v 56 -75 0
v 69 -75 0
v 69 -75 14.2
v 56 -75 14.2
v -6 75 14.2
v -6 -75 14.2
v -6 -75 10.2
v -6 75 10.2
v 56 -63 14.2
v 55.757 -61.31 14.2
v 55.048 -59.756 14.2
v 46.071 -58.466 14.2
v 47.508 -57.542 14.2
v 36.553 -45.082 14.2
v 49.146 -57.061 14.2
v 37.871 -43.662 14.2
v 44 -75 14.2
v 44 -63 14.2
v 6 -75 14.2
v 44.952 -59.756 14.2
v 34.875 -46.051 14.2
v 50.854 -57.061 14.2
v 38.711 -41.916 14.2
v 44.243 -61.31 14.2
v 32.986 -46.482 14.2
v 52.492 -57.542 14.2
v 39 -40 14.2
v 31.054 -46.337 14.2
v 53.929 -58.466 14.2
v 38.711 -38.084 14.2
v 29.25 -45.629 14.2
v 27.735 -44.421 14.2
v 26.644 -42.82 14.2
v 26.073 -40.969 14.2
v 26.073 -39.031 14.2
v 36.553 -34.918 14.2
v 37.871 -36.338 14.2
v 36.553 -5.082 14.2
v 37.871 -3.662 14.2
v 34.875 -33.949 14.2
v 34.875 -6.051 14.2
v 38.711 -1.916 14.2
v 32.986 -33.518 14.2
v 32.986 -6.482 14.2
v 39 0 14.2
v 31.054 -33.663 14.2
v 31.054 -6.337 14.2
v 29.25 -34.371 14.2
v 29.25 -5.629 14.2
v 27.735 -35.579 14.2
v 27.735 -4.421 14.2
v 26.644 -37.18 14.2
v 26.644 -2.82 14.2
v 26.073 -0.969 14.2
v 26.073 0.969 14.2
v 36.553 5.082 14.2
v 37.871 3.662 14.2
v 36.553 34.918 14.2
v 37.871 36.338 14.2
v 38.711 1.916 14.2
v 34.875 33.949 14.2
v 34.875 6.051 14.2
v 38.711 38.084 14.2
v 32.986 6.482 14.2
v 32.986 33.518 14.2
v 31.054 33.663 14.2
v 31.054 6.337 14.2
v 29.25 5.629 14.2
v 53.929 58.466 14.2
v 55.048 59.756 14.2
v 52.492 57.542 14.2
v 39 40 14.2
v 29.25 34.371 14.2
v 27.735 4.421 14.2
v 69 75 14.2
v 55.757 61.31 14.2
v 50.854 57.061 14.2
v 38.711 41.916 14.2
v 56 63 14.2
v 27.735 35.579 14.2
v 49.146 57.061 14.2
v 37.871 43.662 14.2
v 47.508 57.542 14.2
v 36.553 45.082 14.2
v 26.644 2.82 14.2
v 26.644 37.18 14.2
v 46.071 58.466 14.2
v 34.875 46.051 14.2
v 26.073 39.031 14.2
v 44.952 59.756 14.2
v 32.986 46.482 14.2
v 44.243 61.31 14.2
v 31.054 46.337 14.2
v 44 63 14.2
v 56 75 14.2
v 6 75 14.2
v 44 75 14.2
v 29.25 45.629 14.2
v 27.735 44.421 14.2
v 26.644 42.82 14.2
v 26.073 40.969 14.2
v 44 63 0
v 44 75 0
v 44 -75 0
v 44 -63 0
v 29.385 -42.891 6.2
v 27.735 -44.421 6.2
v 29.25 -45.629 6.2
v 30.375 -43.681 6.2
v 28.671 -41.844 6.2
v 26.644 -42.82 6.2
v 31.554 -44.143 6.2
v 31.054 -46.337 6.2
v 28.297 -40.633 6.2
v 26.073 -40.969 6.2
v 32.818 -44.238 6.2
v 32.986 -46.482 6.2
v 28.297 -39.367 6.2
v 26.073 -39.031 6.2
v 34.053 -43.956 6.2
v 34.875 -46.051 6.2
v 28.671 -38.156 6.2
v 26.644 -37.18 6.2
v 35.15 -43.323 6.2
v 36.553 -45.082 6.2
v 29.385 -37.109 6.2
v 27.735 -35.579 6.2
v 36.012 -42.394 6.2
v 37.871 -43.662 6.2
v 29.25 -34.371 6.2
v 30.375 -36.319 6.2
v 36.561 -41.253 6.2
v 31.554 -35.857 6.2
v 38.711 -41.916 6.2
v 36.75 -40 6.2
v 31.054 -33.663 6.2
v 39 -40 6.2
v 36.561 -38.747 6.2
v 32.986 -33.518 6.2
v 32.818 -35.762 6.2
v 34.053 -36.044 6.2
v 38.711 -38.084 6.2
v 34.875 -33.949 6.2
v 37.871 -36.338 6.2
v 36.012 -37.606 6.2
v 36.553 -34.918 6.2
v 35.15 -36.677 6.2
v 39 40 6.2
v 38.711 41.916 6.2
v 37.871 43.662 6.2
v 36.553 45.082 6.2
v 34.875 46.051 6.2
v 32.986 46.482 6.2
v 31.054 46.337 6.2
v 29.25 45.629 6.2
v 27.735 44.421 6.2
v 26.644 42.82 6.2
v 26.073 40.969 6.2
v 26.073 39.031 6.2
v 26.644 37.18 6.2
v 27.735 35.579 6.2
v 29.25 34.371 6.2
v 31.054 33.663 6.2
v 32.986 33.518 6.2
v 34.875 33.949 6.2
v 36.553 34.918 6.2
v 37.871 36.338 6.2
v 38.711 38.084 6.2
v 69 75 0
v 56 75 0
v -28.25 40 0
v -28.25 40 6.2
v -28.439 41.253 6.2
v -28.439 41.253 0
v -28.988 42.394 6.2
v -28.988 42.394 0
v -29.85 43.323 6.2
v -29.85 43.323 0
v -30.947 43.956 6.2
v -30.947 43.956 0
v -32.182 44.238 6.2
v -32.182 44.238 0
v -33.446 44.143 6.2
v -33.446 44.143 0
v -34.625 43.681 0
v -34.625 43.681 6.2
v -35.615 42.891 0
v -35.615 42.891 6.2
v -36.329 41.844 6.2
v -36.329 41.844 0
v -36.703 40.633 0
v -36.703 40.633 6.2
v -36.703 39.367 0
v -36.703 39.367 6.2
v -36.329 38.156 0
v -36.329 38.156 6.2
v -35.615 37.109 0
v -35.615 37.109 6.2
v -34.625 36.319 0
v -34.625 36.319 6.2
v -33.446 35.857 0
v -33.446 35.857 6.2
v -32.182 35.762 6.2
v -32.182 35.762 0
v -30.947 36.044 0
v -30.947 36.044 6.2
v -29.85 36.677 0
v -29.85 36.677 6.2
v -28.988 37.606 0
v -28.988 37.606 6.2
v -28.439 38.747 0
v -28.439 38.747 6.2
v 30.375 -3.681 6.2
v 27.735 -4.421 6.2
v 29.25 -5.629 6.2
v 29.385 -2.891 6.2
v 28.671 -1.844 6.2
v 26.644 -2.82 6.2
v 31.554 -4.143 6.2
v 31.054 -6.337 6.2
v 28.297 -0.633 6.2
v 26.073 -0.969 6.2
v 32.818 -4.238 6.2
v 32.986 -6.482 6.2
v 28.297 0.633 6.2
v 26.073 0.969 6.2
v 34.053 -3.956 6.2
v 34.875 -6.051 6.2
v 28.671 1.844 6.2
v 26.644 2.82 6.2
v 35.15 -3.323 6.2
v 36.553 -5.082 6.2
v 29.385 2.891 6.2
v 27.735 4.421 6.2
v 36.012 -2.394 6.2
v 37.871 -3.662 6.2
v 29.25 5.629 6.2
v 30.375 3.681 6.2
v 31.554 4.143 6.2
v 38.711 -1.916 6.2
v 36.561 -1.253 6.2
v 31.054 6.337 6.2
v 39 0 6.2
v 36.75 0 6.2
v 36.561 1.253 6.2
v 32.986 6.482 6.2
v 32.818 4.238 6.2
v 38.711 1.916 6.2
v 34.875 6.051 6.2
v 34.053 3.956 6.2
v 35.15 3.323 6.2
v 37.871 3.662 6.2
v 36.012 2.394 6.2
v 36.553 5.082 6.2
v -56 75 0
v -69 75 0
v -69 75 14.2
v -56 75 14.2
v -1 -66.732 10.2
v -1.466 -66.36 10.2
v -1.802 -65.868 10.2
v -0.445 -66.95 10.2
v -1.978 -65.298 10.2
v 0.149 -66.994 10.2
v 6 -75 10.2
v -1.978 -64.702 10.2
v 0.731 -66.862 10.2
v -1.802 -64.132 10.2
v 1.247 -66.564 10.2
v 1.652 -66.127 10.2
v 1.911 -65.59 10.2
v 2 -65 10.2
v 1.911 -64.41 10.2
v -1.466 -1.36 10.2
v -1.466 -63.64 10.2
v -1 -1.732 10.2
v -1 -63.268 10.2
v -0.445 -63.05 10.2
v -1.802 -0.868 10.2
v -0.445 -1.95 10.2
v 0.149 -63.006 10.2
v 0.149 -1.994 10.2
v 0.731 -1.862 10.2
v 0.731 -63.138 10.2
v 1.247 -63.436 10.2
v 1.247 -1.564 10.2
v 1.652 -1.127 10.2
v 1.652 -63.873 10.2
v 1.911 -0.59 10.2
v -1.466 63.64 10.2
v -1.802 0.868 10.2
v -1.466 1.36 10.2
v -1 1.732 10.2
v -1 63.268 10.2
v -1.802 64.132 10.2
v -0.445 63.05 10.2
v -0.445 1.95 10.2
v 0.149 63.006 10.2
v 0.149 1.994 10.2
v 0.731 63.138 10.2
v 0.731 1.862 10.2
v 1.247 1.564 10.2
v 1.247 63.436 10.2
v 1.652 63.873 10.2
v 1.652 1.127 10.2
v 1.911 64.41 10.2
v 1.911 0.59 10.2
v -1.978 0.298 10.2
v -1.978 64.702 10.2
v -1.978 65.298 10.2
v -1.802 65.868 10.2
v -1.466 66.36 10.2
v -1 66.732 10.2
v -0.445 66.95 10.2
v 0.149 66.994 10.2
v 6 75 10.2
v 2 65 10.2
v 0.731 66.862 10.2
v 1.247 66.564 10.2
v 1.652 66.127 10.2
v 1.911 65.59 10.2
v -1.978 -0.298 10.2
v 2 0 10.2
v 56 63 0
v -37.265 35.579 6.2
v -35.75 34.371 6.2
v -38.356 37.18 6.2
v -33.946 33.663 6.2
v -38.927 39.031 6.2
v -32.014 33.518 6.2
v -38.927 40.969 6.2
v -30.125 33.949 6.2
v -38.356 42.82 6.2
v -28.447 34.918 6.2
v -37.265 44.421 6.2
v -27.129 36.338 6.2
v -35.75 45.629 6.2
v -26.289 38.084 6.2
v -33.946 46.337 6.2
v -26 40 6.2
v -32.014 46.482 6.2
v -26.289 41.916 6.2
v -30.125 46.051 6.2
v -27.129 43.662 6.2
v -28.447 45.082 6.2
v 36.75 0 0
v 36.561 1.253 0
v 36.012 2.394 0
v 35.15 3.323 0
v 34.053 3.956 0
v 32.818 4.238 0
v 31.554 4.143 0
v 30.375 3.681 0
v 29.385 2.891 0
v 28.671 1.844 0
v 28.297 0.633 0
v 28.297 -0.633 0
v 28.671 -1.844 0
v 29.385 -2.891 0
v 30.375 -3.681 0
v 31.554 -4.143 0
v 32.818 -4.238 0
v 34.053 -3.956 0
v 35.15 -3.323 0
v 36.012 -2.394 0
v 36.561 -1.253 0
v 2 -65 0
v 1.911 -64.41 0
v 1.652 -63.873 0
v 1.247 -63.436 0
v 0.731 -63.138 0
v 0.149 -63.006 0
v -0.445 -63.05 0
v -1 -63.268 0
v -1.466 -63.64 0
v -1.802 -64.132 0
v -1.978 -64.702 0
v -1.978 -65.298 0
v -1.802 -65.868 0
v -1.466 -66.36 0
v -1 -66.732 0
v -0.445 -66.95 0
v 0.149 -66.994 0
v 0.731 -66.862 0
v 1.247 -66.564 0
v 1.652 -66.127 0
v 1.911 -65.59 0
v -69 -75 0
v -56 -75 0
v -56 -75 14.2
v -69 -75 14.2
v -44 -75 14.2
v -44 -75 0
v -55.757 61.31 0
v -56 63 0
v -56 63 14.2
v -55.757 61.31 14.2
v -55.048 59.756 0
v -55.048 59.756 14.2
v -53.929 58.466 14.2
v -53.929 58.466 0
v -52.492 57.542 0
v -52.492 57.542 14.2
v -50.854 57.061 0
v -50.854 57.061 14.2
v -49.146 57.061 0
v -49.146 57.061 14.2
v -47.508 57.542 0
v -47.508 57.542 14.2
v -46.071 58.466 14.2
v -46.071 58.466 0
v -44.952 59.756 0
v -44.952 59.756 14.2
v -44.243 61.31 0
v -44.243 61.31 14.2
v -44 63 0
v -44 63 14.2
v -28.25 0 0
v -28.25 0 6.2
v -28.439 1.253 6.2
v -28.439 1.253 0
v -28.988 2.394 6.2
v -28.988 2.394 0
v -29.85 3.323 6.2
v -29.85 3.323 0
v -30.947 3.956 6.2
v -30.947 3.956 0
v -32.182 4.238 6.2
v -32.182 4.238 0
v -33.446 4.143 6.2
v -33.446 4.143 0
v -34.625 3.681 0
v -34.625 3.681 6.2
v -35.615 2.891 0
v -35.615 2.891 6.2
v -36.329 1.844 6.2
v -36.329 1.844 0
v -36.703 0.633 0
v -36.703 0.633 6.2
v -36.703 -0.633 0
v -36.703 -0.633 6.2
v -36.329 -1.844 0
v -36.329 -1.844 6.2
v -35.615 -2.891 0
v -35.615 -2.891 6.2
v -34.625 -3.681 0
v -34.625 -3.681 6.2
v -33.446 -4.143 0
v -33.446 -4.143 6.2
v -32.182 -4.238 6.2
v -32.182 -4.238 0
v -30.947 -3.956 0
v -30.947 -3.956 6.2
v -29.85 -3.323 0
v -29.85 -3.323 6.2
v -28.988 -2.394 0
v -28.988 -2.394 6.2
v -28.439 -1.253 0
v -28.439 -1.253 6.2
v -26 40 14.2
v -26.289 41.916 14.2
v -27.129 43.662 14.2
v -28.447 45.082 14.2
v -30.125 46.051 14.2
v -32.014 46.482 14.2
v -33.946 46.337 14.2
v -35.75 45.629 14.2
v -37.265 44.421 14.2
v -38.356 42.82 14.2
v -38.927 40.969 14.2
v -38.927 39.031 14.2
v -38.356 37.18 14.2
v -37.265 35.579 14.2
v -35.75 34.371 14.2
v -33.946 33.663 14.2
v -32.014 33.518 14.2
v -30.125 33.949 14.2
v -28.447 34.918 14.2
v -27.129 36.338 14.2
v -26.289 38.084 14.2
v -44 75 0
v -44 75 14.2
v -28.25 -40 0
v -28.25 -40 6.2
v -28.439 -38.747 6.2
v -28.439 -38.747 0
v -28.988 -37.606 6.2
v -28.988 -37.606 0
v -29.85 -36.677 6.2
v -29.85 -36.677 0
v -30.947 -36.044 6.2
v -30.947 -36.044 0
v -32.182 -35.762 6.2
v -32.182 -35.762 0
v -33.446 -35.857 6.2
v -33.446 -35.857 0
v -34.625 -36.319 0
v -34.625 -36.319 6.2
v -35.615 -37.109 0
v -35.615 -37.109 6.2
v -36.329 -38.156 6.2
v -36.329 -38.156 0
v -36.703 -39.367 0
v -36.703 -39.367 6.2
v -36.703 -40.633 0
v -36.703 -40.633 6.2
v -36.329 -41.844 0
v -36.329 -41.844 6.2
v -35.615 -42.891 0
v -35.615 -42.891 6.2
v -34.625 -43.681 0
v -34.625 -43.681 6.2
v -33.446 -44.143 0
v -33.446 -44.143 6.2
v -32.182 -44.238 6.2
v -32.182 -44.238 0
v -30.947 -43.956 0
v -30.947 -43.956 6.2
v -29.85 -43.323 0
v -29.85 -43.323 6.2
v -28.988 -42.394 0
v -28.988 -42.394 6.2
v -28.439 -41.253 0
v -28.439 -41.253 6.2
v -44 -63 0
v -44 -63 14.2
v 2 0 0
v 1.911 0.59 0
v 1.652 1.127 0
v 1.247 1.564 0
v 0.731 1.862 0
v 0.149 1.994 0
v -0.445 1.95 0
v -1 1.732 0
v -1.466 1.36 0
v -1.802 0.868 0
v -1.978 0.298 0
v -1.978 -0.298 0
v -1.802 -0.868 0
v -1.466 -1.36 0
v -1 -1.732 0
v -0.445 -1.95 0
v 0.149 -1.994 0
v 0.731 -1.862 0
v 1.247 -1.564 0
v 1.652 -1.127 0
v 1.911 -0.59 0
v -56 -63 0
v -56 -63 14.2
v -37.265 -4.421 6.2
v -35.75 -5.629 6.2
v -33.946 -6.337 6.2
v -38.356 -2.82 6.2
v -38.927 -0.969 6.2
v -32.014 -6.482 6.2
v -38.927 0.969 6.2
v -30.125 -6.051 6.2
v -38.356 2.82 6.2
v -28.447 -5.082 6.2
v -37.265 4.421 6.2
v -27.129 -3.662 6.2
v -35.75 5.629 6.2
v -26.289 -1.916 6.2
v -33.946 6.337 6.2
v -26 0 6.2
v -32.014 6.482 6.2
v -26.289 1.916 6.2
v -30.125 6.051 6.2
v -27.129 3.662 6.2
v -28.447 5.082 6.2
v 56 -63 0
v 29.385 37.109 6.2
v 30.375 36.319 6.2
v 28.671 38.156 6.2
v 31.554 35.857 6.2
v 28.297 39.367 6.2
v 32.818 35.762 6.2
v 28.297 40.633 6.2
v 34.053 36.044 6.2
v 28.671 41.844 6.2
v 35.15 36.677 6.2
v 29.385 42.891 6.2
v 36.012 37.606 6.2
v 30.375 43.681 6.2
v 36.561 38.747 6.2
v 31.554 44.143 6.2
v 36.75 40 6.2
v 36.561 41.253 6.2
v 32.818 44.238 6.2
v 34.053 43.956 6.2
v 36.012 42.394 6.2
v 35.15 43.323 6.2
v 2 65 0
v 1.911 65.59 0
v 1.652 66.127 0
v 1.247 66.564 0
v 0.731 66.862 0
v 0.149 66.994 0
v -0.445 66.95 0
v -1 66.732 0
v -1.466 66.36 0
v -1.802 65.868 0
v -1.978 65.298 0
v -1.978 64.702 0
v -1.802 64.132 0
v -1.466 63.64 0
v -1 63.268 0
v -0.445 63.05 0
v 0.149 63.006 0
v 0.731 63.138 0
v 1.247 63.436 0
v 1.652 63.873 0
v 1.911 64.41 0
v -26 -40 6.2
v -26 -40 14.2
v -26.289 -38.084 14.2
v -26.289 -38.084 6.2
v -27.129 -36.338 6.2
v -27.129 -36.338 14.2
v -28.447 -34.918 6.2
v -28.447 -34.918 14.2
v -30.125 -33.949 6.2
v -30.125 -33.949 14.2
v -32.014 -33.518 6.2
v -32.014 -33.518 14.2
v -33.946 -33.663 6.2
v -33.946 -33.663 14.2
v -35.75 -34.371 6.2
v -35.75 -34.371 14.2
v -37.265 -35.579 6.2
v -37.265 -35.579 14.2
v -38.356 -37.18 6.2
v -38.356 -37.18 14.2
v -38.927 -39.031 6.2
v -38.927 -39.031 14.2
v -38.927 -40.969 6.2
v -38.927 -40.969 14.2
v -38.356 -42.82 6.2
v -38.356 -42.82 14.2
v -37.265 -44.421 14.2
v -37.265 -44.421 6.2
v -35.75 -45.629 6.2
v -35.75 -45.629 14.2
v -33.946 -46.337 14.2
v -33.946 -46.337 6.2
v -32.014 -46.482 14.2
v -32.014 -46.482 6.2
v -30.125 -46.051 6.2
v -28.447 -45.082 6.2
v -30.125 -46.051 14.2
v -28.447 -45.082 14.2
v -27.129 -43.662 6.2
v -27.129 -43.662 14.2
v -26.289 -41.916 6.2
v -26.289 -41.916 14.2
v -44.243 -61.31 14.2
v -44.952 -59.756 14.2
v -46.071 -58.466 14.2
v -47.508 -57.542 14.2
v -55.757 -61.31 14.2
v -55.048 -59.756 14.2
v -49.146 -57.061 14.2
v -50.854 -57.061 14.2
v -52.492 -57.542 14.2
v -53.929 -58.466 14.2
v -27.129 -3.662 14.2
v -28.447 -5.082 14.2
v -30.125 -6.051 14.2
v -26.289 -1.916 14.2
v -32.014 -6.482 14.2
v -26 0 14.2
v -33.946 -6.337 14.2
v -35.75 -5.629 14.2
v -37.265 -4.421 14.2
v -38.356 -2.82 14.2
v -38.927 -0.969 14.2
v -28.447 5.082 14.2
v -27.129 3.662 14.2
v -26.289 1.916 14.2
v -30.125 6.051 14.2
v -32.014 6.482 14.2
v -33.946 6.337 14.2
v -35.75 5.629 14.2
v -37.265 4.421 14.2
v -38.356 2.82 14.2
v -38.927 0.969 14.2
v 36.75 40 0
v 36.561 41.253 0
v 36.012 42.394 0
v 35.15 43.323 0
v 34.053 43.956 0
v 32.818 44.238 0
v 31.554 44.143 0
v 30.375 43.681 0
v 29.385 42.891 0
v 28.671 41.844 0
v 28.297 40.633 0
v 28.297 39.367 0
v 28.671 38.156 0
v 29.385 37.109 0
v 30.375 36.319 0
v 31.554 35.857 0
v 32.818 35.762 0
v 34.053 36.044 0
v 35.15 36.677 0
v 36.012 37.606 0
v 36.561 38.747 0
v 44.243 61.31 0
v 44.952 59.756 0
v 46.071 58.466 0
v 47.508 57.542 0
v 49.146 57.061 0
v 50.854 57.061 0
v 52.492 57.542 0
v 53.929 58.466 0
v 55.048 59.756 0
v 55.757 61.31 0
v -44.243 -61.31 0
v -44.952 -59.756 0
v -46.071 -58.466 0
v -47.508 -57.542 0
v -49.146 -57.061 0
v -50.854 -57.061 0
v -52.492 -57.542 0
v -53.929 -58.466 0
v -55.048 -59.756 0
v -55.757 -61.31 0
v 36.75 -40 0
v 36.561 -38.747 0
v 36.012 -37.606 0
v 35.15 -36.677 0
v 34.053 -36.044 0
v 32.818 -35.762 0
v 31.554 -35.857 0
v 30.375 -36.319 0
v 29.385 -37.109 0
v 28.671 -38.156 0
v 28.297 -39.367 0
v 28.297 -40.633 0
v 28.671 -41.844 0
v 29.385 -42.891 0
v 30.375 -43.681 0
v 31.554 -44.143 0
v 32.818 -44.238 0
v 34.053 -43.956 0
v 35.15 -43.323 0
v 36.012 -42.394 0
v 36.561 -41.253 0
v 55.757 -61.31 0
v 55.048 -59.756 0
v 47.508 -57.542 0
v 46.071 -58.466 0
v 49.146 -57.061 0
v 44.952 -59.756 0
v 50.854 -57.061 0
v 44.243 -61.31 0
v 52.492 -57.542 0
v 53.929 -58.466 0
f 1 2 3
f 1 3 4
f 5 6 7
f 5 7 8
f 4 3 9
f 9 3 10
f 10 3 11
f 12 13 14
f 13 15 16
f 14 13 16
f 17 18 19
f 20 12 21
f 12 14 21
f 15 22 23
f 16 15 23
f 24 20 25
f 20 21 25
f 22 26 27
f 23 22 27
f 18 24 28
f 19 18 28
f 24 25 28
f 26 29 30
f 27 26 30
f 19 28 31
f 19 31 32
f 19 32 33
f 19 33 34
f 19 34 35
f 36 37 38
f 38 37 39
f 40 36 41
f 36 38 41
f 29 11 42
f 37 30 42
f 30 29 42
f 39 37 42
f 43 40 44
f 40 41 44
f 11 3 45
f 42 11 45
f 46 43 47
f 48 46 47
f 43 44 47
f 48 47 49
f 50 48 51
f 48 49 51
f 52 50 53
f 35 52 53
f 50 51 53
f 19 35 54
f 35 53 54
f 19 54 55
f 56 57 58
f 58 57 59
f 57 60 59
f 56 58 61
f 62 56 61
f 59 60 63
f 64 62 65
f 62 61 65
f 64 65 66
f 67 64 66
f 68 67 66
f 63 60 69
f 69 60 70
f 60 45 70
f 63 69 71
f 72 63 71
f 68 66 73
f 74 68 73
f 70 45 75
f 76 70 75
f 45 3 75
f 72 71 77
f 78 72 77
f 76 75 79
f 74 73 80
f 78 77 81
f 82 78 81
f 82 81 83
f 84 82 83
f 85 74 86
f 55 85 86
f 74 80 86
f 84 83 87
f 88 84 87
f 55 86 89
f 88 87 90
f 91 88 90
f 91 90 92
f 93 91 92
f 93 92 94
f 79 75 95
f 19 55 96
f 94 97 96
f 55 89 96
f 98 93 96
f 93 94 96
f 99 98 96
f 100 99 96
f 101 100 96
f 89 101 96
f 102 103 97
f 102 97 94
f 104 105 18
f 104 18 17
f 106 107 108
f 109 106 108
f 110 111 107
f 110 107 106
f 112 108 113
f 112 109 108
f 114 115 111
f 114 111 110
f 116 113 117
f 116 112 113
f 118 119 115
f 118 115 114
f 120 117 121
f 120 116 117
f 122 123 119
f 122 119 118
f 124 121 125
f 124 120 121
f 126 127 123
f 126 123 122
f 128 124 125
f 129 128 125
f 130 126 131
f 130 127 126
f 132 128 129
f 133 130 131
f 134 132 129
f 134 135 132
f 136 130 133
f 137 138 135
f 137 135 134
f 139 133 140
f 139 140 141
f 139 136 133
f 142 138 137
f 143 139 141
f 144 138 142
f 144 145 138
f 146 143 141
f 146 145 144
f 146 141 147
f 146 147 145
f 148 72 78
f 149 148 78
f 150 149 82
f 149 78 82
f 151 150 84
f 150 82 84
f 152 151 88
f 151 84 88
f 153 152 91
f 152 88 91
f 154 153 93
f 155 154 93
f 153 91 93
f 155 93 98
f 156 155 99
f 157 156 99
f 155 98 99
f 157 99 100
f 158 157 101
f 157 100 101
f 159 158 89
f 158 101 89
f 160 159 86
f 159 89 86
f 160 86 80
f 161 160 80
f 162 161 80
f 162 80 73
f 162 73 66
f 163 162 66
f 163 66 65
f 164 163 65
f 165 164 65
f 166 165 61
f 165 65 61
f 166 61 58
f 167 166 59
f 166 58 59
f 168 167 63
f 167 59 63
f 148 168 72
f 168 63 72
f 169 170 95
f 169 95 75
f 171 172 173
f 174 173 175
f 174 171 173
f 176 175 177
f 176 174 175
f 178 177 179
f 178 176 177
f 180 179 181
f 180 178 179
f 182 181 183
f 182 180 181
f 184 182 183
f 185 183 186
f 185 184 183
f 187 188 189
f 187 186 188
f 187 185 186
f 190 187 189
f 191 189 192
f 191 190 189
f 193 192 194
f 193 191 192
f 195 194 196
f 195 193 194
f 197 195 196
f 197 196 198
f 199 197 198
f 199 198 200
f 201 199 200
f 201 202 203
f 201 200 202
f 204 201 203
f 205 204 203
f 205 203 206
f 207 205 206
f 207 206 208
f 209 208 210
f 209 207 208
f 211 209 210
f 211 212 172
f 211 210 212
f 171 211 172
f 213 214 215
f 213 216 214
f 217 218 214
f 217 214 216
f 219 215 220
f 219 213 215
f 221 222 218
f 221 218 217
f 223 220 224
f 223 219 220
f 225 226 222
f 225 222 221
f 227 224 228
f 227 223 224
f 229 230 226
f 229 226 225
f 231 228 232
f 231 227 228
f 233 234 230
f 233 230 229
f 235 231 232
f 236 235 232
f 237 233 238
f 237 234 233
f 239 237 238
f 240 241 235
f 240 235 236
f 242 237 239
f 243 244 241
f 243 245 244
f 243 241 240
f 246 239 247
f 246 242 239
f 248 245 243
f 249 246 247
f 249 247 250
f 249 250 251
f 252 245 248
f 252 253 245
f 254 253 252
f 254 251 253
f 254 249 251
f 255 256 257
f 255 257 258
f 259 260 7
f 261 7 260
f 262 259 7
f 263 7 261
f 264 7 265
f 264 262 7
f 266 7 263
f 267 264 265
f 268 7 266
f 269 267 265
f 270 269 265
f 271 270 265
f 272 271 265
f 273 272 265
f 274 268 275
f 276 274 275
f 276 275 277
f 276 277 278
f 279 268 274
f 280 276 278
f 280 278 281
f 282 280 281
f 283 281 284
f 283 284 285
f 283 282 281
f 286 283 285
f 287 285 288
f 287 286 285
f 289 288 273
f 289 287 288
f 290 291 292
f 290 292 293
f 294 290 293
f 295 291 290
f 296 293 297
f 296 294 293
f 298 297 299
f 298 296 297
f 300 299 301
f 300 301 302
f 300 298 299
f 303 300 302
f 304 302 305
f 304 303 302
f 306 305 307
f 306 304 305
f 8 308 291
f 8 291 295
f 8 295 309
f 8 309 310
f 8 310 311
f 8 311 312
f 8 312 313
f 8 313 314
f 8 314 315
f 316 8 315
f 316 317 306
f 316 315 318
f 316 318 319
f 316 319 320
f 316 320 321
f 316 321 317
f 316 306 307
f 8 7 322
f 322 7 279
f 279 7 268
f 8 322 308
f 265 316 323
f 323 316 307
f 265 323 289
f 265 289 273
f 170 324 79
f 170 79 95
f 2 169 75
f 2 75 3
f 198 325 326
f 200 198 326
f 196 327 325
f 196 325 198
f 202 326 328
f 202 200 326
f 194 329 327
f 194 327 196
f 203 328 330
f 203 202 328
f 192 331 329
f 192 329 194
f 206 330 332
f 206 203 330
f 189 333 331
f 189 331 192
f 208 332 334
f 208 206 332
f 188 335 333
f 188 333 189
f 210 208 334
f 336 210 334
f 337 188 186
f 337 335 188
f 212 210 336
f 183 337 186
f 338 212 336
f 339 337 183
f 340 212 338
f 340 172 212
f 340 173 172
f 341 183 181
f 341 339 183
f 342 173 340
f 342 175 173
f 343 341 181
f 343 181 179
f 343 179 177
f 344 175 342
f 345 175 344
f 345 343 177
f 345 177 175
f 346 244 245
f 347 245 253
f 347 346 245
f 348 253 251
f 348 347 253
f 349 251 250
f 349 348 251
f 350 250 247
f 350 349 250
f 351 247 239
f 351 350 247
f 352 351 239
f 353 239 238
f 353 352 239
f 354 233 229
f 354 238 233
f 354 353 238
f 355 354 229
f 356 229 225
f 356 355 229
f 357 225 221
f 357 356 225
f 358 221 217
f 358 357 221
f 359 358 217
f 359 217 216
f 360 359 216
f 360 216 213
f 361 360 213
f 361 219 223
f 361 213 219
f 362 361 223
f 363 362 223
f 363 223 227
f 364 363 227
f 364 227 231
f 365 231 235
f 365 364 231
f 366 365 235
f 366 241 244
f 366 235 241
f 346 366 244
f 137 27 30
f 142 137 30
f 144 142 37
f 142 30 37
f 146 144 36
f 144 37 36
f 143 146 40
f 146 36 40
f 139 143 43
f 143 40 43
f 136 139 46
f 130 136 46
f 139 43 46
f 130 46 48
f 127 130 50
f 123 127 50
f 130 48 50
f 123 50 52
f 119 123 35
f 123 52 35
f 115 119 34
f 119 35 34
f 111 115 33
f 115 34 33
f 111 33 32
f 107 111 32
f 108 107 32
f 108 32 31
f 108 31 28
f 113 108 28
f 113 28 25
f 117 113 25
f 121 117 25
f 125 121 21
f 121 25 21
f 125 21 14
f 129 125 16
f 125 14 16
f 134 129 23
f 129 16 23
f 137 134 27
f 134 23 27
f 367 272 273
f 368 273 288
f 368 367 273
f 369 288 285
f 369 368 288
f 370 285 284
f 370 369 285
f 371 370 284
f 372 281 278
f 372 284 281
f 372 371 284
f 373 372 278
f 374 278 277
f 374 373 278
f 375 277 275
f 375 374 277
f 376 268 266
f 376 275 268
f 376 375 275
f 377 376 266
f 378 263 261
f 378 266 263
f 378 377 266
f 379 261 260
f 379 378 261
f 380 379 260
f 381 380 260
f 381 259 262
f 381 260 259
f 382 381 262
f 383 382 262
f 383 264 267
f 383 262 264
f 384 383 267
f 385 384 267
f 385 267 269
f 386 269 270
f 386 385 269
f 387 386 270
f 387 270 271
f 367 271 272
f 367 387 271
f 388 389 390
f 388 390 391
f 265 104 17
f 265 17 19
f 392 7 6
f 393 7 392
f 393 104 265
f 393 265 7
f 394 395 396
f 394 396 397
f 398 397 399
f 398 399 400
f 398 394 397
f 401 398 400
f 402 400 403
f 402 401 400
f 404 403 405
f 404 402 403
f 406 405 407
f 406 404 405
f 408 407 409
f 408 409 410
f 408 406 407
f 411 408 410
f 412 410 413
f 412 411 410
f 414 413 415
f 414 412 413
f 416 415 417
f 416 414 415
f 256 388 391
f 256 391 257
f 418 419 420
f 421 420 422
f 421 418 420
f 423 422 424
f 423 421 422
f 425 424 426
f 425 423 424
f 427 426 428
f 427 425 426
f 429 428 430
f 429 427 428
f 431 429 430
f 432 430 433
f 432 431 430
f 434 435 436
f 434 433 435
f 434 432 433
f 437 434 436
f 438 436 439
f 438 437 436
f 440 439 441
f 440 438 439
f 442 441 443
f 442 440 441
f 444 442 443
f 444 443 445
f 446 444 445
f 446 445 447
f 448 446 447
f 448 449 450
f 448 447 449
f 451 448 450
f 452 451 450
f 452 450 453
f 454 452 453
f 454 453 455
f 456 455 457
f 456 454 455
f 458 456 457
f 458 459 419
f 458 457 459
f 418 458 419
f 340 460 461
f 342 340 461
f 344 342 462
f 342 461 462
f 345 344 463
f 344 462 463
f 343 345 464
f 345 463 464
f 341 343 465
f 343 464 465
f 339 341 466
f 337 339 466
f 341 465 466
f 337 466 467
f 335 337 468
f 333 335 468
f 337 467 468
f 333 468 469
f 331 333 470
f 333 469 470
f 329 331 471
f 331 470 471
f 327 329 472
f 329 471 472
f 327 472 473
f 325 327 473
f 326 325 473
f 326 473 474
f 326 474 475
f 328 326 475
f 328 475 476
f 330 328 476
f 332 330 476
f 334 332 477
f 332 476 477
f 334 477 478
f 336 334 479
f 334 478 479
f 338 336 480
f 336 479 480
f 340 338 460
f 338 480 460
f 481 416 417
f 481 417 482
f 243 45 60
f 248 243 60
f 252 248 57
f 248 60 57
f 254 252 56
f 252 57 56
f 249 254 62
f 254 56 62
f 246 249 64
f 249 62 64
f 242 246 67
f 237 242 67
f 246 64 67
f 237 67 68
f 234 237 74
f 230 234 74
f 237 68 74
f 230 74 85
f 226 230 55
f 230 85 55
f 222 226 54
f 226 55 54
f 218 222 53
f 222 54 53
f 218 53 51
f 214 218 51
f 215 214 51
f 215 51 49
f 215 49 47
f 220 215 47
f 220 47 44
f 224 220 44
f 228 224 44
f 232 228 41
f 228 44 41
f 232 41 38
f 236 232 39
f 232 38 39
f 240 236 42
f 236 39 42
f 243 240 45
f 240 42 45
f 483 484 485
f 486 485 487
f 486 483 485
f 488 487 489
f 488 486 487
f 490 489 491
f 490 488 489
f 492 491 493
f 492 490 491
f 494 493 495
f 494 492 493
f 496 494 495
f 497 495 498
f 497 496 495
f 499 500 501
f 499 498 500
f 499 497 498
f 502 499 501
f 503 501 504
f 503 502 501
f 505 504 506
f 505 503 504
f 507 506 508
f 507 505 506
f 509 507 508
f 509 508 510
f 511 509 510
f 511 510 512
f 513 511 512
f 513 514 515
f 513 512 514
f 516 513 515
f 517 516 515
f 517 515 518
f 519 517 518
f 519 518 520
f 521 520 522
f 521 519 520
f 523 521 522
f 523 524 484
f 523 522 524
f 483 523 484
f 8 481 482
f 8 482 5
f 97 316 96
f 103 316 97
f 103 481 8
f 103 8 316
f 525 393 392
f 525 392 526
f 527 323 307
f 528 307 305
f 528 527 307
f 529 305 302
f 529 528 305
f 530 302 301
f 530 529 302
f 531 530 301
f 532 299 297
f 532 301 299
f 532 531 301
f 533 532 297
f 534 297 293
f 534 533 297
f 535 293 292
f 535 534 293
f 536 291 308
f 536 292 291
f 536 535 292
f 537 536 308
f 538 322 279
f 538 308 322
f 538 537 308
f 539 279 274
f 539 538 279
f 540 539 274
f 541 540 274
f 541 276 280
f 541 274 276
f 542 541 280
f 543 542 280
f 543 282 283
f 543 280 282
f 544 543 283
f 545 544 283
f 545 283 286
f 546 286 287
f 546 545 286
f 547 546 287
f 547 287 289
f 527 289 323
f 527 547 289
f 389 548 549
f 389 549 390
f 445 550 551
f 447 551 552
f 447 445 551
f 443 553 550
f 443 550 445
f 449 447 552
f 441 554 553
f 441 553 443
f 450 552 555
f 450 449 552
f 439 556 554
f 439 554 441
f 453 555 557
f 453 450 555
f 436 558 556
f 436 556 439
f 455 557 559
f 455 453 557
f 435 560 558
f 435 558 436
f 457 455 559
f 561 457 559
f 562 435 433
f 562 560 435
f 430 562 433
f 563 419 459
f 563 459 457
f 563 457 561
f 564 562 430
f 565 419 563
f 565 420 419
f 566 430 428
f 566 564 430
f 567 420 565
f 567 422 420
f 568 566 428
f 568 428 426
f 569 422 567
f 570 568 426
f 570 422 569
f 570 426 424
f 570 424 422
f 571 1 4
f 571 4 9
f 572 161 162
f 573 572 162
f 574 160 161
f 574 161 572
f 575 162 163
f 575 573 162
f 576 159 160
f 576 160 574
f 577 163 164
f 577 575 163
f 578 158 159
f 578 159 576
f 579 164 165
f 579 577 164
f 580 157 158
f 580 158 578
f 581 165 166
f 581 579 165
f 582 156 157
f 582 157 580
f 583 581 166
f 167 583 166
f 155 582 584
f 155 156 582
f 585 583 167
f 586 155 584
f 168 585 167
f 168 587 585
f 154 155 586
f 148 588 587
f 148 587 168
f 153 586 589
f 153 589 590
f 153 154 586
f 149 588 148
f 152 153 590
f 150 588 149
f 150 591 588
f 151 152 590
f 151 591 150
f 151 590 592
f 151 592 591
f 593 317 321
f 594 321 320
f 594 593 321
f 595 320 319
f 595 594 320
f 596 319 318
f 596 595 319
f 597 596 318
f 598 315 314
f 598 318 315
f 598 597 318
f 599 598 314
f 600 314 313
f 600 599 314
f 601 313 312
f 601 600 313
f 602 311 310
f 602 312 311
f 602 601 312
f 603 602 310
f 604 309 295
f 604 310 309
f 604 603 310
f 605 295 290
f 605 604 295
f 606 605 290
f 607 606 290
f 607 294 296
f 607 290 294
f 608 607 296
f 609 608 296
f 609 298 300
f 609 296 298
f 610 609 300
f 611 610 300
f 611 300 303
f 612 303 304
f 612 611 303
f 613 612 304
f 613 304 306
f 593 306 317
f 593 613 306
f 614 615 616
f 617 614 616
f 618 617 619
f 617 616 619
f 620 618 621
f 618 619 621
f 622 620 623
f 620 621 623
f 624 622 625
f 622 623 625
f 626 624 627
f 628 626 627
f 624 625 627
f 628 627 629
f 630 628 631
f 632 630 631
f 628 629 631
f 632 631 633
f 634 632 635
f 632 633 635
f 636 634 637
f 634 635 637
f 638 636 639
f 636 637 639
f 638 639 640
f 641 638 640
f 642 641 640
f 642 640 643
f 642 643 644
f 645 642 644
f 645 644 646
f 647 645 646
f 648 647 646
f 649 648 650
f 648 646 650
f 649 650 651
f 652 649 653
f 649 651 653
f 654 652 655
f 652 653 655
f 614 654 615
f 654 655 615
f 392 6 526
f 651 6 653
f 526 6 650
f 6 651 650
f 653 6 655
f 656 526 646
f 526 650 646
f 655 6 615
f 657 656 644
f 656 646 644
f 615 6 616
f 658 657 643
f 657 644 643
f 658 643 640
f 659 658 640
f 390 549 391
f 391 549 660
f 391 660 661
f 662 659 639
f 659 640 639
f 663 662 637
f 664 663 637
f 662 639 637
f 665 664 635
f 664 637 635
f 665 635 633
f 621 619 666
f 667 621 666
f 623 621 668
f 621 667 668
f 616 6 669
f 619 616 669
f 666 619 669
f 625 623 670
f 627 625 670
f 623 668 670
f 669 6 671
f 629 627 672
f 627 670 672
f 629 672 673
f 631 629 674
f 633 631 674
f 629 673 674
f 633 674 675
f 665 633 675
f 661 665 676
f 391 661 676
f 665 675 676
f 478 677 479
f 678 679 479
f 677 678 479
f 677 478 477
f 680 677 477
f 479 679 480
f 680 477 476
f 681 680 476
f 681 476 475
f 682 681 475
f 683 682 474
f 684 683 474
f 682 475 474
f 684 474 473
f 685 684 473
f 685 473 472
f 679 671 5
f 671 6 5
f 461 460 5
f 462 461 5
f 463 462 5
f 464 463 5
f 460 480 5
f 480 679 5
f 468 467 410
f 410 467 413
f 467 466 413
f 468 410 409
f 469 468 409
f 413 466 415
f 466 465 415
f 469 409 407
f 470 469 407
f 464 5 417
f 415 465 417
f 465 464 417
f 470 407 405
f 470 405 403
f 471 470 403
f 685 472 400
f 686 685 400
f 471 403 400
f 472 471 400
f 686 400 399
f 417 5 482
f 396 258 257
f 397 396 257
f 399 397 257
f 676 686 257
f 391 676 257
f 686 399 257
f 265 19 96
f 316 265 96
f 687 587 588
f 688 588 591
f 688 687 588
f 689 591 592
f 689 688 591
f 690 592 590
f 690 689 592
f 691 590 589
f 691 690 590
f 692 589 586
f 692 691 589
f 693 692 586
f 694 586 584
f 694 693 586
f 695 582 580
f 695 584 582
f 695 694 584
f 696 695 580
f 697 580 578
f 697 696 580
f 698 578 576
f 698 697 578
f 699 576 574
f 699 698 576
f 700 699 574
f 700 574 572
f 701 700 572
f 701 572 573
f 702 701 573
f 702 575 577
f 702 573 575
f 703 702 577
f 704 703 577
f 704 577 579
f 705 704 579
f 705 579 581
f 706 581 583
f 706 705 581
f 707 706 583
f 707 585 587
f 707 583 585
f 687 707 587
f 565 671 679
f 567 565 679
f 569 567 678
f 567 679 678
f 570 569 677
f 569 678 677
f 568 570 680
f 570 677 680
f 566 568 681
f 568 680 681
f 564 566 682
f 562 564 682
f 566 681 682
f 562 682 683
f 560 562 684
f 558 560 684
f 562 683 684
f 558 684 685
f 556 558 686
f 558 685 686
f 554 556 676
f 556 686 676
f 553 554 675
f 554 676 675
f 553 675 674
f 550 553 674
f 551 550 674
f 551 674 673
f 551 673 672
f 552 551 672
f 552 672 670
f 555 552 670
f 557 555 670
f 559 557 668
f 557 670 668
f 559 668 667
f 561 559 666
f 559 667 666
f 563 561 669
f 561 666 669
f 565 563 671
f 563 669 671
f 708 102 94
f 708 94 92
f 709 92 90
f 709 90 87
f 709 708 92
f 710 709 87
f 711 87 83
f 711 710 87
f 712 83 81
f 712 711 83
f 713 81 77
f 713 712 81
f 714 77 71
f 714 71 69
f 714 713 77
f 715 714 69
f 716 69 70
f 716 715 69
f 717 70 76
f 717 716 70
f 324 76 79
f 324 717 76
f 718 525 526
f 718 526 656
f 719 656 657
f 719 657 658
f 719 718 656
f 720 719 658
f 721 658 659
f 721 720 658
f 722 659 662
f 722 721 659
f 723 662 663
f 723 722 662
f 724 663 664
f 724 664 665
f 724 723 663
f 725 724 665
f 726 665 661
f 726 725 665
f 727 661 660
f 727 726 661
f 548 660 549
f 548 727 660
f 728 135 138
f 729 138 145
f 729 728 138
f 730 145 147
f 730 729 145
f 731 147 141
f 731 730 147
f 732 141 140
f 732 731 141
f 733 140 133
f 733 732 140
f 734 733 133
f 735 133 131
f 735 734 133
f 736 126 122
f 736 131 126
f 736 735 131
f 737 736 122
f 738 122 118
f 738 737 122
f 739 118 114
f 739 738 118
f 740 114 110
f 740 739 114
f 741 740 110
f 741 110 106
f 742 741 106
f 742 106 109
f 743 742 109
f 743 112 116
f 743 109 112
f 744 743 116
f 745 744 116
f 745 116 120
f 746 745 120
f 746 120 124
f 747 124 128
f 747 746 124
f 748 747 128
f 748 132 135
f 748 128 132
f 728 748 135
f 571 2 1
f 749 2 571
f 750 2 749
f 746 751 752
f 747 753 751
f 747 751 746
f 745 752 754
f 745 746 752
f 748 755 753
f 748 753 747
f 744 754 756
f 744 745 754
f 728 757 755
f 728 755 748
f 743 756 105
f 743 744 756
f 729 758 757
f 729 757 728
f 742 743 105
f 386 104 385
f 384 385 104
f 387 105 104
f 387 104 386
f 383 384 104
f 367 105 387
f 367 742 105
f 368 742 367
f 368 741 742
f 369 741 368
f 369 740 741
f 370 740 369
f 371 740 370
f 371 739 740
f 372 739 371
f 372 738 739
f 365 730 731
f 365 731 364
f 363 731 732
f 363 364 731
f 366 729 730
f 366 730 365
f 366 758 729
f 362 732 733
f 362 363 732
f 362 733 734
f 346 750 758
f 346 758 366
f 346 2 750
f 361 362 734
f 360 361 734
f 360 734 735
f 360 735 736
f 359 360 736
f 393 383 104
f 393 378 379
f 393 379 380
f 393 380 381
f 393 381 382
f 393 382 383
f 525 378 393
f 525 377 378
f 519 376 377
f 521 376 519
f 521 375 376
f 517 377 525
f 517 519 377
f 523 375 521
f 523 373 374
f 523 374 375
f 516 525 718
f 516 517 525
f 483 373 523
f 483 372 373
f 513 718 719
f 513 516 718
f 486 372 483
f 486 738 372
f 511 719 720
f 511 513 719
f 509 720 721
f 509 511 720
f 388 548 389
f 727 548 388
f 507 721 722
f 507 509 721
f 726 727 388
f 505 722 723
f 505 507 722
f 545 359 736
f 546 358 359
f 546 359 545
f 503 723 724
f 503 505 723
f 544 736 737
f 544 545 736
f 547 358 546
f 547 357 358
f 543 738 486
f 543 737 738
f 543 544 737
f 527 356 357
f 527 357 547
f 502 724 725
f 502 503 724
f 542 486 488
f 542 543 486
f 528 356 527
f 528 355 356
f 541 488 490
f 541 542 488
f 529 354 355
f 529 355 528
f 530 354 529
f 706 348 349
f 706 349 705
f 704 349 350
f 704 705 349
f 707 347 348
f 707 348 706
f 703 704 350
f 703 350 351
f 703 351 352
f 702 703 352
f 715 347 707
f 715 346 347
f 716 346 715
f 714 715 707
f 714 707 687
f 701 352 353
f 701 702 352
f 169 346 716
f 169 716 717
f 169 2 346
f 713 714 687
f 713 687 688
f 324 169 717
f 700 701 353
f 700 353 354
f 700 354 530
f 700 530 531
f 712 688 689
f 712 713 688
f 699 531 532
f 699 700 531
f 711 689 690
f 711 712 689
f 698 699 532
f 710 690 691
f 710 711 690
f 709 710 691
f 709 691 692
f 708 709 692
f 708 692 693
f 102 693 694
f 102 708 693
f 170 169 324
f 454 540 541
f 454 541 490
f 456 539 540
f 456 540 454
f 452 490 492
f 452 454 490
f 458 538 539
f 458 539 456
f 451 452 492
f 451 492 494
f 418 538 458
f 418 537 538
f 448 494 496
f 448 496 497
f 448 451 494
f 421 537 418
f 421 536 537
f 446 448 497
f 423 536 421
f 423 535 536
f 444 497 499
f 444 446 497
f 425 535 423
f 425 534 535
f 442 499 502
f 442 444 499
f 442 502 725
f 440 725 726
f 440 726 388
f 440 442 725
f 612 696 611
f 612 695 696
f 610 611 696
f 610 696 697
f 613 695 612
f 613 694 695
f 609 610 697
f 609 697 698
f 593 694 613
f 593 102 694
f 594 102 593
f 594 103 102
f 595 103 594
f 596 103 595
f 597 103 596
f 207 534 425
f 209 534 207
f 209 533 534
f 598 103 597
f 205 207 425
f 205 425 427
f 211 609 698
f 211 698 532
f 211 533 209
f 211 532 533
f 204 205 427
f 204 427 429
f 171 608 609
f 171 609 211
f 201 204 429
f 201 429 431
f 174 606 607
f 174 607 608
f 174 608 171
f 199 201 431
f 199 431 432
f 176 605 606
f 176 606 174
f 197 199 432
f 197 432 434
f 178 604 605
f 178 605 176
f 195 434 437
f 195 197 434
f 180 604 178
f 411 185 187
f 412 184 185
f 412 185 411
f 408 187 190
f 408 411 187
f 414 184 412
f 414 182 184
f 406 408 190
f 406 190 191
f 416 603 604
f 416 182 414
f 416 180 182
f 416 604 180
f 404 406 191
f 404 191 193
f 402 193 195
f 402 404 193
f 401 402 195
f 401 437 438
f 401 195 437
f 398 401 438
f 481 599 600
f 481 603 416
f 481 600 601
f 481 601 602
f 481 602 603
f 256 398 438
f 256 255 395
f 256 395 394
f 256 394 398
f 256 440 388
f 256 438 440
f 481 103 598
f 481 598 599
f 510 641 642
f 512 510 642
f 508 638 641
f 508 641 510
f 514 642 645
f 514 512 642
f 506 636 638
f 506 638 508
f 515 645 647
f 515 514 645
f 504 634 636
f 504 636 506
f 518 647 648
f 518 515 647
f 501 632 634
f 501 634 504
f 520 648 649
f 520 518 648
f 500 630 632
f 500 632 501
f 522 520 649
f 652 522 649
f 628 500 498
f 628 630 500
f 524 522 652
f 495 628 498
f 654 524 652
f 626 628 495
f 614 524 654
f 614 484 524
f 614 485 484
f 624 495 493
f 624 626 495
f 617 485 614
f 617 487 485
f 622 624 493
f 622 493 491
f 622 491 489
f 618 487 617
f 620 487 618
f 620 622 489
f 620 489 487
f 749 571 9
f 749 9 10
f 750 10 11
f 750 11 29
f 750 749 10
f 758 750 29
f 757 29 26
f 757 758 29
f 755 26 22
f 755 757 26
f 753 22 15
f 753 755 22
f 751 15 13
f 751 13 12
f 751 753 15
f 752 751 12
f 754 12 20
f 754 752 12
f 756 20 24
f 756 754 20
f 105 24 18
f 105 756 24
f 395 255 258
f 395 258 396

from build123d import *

# Parameters (mm, degrees)
CROQUIS1_R              = 4.25
CROQUIS1_R_2            = 2
SALIENTE_EXTRUIR1_DEPTH = 14.2
CROQUIS2_W              = 12
CROQUIS2_H              = 162.31128511
CORTAR_EXTRUIR1_DEPTH   = 4
CROQUIS3_R              = 6.5
CORTAR_EXTRUIR2_DEPTH   = 8


with BuildPart() as part:
    # Croquis1 → Saliente-Extruir1 (new body)
    with BuildSketch(Plane.XY):
        with BuildLine():
            Line((69, -75), (56, -75))
            Line((56, -75), (56, -63))
            ThreePointArc((56, -63), (50, -57), (44, -63))
            Line((44, -63), (44, -75))
            Line((44, -75), (-44, -75))
            Line((-44, -75), (-44, -63))
            ThreePointArc((-44, -63), (-50, -57), (-56, -63))
            Line((-56, -63), (-56, -75))
            Line((-56, -75), (-69, -75))
            Line((-69, -75), (-69, 75))
            Line((-69, 75), (-56, 75))
            Line((-56, 75), (-56, 63))
            ThreePointArc((-56, 63), (-50, 57), (-44, 63))
            Line((-44, 63), (-44, 75))
            Line((-44, 75), (44, 75))
            Line((44, 75), (44, 63))
            ThreePointArc((44, 63), (50, 57), (56, 63))
            Line((56, 63), (56, 75))
            Line((56, 75), (69, 75))
            Line((69, 75), (69, -75))
        make_face()
        with Locations((-32.5, 40)):
            Circle(CROQUIS1_R, mode=Mode.SUBTRACT)
        with Locations((-32.5, 0)):
            Circle(CROQUIS1_R, mode=Mode.SUBTRACT)
        with Locations((-32.5, -40)):
            Circle(CROQUIS1_R, mode=Mode.SUBTRACT)
        with Locations((32.5, 40)):
            Circle(CROQUIS1_R, mode=Mode.SUBTRACT)
        with Locations((32.5, 0)):
            Circle(CROQUIS1_R, mode=Mode.SUBTRACT)
        with Locations((32.5, -40)):
            Circle(CROQUIS1_R, mode=Mode.SUBTRACT)
        with Locations((0, 65)):
            Circle(CROQUIS1_R_2, mode=Mode.SUBTRACT)
        Circle(CROQUIS1_R_2, mode=Mode.SUBTRACT)
        with Locations((0, -65)):
            Circle(CROQUIS1_R_2, mode=Mode.SUBTRACT)
    extrude(amount=SALIENTE_EXTRUIR1_DEPTH)

    # Croquis2 → Cortar-Extruir1 (cut)
    with BuildSketch(Plane.XY.offset(14.2)):
        with Locations((0, -0.838384737)):
            Rectangle(CROQUIS2_W, CROQUIS2_H)
    extrude(amount=-CORTAR_EXTRUIR1_DEPTH, mode=Mode.SUBTRACT)

    # Croquis3 → Cortar-Extruir2 (cut)
    with BuildSketch(Plane.XY.offset(14.2)):
        with Locations((-32.5, 40)):
            Circle(CROQUIS3_R)
        with Locations((-32.5, 0)):
            Circle(CROQUIS3_R)
        with Locations((-32.5, -40)):
            Circle(CROQUIS3_R)
        with Locations((32.5, 40)):
            Circle(CROQUIS3_R)
        with Locations((32.5, 0)):
            Circle(CROQUIS3_R)
        with Locations((32.5, -40)):
            Circle(CROQUIS3_R)
    extrude(amount=-CORTAR_EXTRUIR2_DEPTH, mode=Mode.SUBTRACT)


solid = part.part
